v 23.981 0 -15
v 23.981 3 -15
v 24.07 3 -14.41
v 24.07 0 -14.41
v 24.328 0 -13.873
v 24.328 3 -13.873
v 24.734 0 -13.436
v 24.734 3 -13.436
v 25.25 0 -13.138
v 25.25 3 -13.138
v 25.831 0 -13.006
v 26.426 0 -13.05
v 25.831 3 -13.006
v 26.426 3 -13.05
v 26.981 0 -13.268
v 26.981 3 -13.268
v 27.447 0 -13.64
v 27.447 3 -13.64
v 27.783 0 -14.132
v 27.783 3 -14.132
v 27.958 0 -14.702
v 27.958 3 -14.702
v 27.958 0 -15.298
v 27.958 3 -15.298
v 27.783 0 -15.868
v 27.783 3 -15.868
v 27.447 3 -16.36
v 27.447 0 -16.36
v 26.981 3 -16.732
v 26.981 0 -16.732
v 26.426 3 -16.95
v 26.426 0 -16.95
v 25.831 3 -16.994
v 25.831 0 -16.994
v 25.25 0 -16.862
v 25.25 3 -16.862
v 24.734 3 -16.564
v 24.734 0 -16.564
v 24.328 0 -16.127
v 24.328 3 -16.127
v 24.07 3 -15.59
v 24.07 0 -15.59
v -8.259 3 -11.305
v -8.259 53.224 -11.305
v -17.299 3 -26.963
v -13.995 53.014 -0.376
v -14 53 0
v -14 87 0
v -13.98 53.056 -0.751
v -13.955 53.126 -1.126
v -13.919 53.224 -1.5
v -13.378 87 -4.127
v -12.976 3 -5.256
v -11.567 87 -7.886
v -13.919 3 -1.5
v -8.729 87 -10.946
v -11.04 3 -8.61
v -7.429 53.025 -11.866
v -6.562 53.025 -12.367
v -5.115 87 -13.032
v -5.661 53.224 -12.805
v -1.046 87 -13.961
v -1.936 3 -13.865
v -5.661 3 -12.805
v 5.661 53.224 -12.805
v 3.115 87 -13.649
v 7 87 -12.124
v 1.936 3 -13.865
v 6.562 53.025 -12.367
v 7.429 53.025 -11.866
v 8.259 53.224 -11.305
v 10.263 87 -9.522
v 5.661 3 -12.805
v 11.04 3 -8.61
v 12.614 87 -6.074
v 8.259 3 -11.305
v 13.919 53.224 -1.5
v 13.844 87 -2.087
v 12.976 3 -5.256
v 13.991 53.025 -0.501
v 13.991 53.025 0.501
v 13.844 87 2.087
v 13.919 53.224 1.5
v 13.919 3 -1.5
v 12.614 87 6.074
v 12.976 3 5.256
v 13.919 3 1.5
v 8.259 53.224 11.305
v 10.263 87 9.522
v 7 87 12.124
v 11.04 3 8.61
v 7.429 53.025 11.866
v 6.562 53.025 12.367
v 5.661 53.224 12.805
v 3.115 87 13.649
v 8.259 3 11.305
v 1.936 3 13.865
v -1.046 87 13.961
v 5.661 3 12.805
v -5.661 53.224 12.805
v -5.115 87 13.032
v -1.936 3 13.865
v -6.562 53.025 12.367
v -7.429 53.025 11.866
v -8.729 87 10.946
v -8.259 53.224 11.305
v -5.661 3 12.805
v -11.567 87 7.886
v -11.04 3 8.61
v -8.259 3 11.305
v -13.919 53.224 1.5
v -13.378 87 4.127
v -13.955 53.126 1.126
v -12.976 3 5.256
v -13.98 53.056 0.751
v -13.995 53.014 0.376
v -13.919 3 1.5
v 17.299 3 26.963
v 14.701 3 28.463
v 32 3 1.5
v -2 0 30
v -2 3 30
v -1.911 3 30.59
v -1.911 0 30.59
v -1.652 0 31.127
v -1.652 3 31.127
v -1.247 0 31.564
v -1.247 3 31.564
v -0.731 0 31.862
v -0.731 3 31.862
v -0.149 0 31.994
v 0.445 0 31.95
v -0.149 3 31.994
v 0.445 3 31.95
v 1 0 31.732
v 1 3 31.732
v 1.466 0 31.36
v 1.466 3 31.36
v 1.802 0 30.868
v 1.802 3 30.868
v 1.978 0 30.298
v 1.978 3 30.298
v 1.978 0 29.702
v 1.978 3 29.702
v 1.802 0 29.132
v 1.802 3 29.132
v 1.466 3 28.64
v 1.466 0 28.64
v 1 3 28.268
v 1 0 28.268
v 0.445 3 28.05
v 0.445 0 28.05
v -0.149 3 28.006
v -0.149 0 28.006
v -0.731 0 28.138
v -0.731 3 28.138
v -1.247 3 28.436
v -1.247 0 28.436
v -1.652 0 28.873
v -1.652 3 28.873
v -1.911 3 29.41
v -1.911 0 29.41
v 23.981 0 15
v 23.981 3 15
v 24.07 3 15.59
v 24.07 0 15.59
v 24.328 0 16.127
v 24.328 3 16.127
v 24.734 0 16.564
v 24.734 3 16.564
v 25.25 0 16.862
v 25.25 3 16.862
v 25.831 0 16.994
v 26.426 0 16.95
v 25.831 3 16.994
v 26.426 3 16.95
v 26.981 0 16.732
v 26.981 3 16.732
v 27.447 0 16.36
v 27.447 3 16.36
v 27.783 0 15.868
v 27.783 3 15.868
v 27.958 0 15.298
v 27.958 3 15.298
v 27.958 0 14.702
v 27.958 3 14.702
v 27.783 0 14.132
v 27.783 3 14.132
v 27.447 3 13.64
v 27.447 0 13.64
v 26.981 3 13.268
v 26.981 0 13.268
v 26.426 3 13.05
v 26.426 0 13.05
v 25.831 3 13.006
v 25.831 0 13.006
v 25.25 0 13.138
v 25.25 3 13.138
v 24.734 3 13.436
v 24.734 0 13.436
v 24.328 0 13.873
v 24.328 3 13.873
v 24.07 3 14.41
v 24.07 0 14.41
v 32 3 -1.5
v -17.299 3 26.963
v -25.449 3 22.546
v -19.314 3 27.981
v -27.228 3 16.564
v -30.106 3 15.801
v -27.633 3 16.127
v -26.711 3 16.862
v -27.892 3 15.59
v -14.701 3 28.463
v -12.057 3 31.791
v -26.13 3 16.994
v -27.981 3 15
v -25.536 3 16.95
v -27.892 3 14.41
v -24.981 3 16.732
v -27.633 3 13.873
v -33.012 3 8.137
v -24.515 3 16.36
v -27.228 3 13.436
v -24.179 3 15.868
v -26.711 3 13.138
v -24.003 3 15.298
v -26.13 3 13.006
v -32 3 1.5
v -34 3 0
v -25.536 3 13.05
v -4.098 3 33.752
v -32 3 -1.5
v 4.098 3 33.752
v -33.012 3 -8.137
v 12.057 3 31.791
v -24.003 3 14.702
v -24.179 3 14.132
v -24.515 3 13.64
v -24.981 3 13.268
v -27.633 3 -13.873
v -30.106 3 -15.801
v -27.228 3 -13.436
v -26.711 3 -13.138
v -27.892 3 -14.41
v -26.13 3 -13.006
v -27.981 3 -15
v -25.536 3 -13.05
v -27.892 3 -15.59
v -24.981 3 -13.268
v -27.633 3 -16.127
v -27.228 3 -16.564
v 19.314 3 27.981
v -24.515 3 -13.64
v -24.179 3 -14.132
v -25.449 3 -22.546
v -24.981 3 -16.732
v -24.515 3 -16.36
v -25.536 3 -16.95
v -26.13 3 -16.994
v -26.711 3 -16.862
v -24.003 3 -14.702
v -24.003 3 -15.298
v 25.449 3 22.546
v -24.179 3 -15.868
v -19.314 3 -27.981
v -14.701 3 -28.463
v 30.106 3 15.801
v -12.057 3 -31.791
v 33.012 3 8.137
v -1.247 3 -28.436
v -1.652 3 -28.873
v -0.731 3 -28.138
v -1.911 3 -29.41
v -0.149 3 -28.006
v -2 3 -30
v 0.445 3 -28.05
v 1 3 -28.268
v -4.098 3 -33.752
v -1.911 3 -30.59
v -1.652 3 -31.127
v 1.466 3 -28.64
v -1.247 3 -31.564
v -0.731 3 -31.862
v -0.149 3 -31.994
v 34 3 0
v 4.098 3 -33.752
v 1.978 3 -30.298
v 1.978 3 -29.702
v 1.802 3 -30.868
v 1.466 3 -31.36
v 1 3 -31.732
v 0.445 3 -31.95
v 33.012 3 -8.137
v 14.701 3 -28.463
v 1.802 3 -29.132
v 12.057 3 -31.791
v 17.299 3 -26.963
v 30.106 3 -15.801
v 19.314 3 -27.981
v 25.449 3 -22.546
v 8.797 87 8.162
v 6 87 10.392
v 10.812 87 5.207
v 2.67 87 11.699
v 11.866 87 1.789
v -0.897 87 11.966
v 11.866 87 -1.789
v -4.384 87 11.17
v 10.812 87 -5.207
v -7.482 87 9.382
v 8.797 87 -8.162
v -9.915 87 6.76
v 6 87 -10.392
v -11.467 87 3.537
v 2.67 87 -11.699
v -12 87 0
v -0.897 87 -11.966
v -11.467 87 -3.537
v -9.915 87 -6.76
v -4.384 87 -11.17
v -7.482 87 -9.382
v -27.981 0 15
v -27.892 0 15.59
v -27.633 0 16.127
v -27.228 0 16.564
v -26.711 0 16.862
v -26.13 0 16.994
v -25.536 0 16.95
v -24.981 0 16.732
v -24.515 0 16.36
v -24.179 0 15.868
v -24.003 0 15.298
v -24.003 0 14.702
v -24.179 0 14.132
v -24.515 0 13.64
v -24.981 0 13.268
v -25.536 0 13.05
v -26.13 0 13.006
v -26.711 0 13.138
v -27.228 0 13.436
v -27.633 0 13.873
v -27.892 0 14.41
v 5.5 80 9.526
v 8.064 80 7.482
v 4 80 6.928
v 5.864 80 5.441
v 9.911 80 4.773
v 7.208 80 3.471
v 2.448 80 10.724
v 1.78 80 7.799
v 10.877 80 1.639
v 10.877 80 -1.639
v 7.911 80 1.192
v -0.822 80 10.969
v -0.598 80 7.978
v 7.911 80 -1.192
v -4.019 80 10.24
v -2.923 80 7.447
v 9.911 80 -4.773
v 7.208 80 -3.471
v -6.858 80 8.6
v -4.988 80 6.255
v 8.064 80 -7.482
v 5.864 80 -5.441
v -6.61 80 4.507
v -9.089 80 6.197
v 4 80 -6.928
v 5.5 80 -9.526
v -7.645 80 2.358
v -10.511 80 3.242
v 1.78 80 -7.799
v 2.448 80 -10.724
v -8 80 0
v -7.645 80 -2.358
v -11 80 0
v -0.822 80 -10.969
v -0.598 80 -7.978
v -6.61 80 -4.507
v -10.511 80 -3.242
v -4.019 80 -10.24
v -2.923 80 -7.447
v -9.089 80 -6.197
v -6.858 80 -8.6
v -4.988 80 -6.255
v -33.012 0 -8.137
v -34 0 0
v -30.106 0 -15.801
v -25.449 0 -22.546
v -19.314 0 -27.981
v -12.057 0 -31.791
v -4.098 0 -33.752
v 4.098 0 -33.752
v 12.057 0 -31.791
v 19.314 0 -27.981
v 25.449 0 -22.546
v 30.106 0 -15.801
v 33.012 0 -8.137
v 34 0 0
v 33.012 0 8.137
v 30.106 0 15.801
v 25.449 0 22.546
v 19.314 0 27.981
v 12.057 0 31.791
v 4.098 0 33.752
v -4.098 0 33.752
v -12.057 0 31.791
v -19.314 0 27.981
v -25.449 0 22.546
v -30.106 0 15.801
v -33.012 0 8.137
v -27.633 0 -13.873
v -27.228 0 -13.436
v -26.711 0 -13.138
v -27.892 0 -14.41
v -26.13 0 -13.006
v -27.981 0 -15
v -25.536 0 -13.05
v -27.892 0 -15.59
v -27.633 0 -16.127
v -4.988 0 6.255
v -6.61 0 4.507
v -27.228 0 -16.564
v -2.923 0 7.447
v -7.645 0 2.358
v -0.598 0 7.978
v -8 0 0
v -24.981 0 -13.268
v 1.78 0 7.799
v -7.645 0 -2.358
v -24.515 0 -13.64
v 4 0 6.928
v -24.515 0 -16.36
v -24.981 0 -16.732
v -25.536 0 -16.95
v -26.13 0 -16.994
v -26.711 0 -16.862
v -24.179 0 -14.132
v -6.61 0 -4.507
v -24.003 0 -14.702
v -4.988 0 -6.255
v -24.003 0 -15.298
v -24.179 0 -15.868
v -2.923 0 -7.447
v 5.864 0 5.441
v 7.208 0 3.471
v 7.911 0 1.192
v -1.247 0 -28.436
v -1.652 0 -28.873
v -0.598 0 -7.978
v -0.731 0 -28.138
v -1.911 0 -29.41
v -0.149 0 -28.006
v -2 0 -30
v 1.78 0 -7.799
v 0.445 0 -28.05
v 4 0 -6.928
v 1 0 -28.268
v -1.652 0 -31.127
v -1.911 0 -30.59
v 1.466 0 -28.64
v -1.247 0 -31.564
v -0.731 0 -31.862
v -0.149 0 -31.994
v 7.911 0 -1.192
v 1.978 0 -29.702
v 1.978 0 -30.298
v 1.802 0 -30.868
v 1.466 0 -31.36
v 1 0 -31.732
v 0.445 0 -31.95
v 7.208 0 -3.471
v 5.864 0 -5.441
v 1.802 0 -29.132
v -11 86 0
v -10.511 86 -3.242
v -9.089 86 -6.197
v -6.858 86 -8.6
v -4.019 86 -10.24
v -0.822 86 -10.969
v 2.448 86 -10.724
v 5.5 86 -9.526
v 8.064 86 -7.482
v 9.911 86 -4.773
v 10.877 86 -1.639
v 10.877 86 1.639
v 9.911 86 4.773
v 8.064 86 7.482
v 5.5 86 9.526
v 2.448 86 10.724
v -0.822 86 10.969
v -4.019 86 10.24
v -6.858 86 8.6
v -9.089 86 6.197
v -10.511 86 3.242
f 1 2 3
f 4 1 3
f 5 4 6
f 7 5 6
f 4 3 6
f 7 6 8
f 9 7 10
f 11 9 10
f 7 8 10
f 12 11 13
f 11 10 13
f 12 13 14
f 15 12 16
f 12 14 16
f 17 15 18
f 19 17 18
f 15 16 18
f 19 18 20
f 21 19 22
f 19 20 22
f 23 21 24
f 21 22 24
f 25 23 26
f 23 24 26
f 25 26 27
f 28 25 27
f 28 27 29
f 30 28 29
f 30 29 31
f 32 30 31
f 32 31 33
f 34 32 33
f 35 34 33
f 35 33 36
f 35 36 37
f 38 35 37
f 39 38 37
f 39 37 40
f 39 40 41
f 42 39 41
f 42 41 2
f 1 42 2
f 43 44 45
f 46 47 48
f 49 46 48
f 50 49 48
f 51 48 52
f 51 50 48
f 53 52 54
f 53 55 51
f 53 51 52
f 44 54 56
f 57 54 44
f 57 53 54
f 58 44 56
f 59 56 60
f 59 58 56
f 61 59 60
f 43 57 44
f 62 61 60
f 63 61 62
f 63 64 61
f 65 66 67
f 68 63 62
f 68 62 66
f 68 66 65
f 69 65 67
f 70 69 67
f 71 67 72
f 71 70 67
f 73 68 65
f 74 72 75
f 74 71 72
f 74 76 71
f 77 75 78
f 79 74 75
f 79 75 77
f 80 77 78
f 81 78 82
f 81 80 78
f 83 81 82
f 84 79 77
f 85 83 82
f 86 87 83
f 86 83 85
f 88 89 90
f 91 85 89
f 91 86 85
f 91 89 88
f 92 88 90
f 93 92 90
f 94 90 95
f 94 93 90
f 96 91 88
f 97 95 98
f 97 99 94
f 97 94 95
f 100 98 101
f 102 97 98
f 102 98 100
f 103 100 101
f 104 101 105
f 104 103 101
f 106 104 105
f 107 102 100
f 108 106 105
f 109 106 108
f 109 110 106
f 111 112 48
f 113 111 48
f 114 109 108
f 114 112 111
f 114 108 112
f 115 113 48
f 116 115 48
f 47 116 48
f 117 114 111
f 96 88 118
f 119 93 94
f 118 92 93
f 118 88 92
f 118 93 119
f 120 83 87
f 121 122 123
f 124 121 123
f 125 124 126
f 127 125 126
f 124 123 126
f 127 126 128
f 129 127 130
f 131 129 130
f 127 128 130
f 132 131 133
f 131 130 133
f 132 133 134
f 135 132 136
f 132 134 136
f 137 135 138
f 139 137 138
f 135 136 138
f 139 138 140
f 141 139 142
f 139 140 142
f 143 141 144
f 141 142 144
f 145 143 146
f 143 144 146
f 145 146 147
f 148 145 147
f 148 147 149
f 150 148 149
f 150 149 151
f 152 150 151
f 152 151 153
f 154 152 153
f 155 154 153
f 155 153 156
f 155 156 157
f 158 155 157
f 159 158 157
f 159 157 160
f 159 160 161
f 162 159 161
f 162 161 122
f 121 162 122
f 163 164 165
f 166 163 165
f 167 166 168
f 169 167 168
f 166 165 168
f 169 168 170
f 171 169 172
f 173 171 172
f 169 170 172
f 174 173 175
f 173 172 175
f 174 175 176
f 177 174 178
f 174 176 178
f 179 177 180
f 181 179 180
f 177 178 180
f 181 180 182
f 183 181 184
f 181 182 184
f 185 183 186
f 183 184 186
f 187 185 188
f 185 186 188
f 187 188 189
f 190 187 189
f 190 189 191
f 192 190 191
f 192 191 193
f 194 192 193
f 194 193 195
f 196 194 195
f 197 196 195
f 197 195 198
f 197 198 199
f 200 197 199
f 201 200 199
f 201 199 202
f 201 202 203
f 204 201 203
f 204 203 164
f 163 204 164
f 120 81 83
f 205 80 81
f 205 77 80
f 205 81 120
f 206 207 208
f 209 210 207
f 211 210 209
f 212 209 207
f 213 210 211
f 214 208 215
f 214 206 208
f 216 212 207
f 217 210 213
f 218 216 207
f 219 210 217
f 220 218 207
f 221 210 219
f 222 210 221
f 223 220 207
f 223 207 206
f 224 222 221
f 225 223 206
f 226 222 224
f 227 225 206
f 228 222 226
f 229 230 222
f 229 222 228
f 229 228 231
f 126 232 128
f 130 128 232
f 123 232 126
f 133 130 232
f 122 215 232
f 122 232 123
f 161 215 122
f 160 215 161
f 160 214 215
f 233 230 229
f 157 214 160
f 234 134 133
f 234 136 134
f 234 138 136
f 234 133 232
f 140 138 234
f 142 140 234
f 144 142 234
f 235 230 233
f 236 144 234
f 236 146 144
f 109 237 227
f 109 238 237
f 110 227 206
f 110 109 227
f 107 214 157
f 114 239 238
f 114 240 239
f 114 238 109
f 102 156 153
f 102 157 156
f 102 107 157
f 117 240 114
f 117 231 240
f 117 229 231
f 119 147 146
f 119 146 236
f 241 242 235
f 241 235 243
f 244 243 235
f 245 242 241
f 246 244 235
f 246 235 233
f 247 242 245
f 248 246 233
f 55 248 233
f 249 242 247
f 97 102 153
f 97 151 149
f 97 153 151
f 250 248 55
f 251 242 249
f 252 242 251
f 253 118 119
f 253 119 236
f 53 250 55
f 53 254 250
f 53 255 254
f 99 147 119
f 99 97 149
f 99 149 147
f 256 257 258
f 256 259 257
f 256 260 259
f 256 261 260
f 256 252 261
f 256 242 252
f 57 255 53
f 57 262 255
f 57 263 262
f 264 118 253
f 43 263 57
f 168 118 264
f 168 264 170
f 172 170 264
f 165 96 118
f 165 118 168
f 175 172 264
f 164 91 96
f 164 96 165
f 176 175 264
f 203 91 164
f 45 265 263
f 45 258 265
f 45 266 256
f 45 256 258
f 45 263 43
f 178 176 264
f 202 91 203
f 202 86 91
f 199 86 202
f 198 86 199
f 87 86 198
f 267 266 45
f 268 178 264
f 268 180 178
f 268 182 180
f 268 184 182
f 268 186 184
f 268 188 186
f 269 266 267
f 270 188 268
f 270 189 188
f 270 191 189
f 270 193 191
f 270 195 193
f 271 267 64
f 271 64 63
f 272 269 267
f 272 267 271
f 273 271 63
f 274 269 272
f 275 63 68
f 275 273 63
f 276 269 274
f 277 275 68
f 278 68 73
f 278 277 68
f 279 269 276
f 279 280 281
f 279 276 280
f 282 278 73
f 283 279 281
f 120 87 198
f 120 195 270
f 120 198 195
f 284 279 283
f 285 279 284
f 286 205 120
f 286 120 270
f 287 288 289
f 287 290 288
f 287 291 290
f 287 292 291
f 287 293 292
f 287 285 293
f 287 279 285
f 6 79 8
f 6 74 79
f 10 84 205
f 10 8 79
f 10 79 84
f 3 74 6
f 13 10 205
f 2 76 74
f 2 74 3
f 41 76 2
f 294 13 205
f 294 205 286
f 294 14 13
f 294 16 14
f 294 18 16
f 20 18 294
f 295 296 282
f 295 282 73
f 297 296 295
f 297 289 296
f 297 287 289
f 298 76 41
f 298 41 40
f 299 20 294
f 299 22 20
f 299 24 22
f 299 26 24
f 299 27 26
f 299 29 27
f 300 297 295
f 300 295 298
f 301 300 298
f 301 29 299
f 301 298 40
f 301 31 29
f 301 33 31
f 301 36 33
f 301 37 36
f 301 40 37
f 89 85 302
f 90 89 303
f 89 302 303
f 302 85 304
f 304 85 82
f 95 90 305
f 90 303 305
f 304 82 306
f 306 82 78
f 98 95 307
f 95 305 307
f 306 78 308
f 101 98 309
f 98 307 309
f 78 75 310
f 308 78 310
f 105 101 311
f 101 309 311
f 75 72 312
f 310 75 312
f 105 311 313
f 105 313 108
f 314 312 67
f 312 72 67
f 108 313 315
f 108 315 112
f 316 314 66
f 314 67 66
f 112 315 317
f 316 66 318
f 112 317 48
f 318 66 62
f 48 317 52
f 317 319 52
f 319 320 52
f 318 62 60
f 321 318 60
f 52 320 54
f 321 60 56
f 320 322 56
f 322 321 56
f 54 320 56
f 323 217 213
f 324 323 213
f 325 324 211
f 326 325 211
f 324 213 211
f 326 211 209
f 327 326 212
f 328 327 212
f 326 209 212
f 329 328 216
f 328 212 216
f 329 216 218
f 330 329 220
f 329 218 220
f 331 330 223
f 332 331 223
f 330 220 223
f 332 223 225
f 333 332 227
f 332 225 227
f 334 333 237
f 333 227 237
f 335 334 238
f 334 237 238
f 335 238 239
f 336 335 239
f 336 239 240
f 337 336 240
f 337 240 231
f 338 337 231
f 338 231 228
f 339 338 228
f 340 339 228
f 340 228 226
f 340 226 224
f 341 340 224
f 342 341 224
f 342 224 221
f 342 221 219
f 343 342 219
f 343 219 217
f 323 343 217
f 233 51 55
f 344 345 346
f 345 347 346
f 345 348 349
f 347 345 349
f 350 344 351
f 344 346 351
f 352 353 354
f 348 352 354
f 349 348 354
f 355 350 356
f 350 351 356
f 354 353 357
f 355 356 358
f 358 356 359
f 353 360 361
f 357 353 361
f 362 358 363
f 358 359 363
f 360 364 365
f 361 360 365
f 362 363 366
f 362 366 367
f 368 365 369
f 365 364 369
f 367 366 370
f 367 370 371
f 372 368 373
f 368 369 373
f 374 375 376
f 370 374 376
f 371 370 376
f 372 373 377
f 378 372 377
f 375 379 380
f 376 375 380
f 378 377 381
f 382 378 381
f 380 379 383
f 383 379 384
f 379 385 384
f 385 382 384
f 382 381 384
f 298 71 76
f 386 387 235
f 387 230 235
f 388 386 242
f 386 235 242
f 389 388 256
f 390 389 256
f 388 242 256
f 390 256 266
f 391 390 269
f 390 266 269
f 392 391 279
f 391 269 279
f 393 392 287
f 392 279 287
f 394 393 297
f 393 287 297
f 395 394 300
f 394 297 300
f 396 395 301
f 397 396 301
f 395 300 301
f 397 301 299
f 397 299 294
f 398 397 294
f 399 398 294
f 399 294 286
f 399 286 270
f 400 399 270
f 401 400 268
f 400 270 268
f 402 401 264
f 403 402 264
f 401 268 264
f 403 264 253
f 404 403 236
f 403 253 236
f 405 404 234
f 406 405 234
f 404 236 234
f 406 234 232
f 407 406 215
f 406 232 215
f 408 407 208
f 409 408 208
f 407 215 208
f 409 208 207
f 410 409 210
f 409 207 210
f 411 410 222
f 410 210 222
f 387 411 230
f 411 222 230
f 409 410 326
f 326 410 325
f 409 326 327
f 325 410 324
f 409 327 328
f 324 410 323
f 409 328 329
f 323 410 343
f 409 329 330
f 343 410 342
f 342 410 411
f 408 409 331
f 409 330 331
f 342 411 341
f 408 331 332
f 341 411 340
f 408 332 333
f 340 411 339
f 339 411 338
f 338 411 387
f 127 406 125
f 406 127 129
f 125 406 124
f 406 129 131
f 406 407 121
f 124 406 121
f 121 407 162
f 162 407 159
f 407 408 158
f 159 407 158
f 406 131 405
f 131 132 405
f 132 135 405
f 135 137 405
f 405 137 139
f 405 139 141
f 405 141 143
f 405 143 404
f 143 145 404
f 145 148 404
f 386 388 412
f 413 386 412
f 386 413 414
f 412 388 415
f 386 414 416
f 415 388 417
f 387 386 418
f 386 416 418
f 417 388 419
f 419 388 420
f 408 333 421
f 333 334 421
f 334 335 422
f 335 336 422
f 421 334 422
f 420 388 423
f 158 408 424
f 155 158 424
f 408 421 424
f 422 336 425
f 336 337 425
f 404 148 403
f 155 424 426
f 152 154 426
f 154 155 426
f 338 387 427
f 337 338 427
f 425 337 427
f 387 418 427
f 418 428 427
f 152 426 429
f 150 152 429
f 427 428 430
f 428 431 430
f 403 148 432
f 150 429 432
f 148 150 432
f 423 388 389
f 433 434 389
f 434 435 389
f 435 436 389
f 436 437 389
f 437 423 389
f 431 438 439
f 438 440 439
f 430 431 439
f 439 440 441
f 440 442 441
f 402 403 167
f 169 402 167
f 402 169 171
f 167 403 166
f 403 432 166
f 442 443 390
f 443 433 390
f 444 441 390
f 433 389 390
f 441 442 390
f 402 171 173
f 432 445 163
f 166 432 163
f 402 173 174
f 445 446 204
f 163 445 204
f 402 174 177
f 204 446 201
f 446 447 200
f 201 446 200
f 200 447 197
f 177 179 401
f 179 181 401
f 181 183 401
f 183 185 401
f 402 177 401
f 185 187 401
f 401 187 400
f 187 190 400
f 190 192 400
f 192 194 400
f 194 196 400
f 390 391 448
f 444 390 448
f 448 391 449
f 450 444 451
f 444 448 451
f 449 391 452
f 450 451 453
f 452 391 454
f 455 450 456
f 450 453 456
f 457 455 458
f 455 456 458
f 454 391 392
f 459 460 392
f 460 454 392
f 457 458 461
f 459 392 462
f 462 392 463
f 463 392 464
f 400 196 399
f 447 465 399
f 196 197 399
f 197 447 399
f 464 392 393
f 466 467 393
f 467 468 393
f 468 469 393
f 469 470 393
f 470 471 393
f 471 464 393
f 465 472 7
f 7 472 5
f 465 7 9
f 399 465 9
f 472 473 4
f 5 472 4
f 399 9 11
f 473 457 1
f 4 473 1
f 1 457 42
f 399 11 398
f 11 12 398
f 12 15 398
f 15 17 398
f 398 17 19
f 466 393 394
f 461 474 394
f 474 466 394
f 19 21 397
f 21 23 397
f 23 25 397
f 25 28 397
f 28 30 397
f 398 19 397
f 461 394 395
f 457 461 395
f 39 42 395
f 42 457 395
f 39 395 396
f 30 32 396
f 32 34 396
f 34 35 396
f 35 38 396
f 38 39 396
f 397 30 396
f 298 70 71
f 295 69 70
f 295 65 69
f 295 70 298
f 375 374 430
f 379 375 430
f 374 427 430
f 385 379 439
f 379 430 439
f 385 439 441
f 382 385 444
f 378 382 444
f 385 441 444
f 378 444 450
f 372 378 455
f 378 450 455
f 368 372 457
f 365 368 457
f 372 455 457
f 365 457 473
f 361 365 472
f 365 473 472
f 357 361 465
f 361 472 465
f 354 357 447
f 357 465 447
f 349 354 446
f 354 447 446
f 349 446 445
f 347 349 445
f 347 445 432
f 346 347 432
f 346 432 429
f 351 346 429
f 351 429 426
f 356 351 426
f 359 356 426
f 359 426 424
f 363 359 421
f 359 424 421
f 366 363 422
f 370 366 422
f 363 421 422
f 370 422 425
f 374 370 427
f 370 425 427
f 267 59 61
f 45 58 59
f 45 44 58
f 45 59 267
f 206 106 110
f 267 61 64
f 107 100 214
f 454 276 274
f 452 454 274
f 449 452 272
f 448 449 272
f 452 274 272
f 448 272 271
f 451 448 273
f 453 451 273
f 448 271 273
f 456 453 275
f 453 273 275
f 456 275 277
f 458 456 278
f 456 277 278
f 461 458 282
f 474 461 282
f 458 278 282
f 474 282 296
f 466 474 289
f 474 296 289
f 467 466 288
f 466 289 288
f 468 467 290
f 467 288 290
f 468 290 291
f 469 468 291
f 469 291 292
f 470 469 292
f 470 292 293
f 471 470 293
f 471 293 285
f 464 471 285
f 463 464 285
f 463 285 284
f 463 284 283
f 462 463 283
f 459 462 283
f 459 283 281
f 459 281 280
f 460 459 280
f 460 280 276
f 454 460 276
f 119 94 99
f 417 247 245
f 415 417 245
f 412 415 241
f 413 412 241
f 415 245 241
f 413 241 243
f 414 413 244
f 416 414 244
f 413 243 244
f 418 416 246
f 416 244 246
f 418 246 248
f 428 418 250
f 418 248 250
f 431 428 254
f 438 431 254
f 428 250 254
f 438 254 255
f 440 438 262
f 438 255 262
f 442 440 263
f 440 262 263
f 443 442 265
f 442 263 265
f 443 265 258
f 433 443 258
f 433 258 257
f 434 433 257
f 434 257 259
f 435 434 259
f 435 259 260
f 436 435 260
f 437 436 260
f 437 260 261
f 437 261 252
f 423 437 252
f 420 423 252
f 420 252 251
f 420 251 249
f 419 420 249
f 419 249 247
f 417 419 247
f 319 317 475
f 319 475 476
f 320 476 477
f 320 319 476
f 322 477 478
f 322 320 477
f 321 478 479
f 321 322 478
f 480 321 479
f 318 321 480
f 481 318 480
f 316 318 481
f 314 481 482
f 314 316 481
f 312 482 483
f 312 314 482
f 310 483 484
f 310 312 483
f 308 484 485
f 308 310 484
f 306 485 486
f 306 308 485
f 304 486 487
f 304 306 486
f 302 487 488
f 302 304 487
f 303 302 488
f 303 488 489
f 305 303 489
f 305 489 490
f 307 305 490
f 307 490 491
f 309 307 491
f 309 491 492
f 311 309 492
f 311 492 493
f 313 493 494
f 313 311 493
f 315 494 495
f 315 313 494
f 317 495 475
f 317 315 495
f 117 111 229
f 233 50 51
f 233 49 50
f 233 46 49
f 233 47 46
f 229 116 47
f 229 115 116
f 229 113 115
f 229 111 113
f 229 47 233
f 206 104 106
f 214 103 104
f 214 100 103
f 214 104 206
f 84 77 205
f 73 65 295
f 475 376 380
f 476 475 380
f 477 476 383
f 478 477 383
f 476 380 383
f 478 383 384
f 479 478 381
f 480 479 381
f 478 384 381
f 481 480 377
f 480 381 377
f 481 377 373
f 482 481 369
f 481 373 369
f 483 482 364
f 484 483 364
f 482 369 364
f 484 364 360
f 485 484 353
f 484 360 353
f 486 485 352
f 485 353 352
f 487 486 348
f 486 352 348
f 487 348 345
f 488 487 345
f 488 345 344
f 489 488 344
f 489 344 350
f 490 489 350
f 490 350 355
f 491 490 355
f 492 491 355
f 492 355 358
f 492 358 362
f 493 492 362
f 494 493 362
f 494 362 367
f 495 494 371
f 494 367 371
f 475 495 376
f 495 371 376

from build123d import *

# Parameters (mm, degrees)
ESQUISSE2_R                  = 2
ENL_V_MAT_EXTRU_1_DEPTH      = 97.788429061
CHANFREIN1_SIZE              = 1
NERVURE11_REACH              = 101.403
ESQUISSE5_WALL_W             = 253.94775955
ESQUISSE5_WALL_H             = 3
R_P_TITION_CIRCULAIRE1_COUNT = 6


with BuildPart() as part:
    # Esquisse1 → Révolution1 (revolve)
    with BuildSketch(Plane.XY):
        Polygon((-8, 0), (-34, 0), (-34, 3), (-19, 3), (-14, 3), (-14, 8), (-14, 87), (-11, 87), (-11, 80), (-8, 80), align=None)
    revolve(axis=Axis((0, 5.729166667, 0), (0, -1, 0)))

    # Esquisse2 → Enlèv. mat.-Extru.1 (cut, through all)
    with BuildSketch(Plane(origin=(0, 3, 0), x_dir=(1, 0, 0), z_dir=(0, 1, 0))):
        with Locations(Location((0, 30, 0), (0, 0, 180))):
            Circle(ESQUISSE2_R)
        with Locations(Location((25.980762114, 15, 0), (0, 0, 180))):
            Circle(ESQUISSE2_R)
        with Locations(Location((25.980762114, -15, 0), (0, 0, 180))):
            Circle(ESQUISSE2_R)
        with Locations(Location((0, -30, 0), (0, 0, 180))):
            Circle(ESQUISSE2_R)
        with Locations(Location((-25.980762114, -15, 0), (0, 0, 180))):
            Circle(ESQUISSE2_R)
        with Locations(Location((-25.980762114, 15, 0), (0, 0, 180))):
            Circle(ESQUISSE2_R)
    extrude(amount=-ENL_V_MAT_EXTRU_1_DEPTH, mode=Mode.SUBTRACT)

    # Chanfrein1
    chanfrein1_edges = [part.edges().sort_by_distance(p)[0] for p in [
        (11, 87, 0),
    ]]
    chamfer(chanfrein1_edges, length=CHANFREIN1_SIZE)

    # Esquisse5 wall → Nervure11 (add, up to next)
    with BuildSketch(Plane(origin=(23, 28, 0), x_dir=(0.338719468273, -0.940887411869, 0), z_dir=(0.940887411869, 0.338719468273, 0)), mode=Mode.PRIVATE) as nervure11_sk1:
        Rectangle(ESQUISSE5_WALL_W, ESQUISSE5_WALL_H)
    nervure11_tool1 = extrude(nervure11_sk1.sketch, amount=-NERVURE11_REACH, mode=Mode.PRIVATE) - part.part
    nervure11 = nervure11_tool1.solids().sort_by_distance((23, 28, 0))[0]
    add(nervure11)

    # Répétition circulaire1: Nervure11 ×6 about axis
    r_p_tition_circulaire1_axis = Axis((0, 0, 0), (0, 1, 0))
    for i in range(1, R_P_TITION_CIRCULAIRE1_COUNT):
        add(nervure11.rotate(r_p_tition_circulaire1_axis, i * 360 / R_P_TITION_CIRCULAIRE1_COUNT))


solid = part.part
